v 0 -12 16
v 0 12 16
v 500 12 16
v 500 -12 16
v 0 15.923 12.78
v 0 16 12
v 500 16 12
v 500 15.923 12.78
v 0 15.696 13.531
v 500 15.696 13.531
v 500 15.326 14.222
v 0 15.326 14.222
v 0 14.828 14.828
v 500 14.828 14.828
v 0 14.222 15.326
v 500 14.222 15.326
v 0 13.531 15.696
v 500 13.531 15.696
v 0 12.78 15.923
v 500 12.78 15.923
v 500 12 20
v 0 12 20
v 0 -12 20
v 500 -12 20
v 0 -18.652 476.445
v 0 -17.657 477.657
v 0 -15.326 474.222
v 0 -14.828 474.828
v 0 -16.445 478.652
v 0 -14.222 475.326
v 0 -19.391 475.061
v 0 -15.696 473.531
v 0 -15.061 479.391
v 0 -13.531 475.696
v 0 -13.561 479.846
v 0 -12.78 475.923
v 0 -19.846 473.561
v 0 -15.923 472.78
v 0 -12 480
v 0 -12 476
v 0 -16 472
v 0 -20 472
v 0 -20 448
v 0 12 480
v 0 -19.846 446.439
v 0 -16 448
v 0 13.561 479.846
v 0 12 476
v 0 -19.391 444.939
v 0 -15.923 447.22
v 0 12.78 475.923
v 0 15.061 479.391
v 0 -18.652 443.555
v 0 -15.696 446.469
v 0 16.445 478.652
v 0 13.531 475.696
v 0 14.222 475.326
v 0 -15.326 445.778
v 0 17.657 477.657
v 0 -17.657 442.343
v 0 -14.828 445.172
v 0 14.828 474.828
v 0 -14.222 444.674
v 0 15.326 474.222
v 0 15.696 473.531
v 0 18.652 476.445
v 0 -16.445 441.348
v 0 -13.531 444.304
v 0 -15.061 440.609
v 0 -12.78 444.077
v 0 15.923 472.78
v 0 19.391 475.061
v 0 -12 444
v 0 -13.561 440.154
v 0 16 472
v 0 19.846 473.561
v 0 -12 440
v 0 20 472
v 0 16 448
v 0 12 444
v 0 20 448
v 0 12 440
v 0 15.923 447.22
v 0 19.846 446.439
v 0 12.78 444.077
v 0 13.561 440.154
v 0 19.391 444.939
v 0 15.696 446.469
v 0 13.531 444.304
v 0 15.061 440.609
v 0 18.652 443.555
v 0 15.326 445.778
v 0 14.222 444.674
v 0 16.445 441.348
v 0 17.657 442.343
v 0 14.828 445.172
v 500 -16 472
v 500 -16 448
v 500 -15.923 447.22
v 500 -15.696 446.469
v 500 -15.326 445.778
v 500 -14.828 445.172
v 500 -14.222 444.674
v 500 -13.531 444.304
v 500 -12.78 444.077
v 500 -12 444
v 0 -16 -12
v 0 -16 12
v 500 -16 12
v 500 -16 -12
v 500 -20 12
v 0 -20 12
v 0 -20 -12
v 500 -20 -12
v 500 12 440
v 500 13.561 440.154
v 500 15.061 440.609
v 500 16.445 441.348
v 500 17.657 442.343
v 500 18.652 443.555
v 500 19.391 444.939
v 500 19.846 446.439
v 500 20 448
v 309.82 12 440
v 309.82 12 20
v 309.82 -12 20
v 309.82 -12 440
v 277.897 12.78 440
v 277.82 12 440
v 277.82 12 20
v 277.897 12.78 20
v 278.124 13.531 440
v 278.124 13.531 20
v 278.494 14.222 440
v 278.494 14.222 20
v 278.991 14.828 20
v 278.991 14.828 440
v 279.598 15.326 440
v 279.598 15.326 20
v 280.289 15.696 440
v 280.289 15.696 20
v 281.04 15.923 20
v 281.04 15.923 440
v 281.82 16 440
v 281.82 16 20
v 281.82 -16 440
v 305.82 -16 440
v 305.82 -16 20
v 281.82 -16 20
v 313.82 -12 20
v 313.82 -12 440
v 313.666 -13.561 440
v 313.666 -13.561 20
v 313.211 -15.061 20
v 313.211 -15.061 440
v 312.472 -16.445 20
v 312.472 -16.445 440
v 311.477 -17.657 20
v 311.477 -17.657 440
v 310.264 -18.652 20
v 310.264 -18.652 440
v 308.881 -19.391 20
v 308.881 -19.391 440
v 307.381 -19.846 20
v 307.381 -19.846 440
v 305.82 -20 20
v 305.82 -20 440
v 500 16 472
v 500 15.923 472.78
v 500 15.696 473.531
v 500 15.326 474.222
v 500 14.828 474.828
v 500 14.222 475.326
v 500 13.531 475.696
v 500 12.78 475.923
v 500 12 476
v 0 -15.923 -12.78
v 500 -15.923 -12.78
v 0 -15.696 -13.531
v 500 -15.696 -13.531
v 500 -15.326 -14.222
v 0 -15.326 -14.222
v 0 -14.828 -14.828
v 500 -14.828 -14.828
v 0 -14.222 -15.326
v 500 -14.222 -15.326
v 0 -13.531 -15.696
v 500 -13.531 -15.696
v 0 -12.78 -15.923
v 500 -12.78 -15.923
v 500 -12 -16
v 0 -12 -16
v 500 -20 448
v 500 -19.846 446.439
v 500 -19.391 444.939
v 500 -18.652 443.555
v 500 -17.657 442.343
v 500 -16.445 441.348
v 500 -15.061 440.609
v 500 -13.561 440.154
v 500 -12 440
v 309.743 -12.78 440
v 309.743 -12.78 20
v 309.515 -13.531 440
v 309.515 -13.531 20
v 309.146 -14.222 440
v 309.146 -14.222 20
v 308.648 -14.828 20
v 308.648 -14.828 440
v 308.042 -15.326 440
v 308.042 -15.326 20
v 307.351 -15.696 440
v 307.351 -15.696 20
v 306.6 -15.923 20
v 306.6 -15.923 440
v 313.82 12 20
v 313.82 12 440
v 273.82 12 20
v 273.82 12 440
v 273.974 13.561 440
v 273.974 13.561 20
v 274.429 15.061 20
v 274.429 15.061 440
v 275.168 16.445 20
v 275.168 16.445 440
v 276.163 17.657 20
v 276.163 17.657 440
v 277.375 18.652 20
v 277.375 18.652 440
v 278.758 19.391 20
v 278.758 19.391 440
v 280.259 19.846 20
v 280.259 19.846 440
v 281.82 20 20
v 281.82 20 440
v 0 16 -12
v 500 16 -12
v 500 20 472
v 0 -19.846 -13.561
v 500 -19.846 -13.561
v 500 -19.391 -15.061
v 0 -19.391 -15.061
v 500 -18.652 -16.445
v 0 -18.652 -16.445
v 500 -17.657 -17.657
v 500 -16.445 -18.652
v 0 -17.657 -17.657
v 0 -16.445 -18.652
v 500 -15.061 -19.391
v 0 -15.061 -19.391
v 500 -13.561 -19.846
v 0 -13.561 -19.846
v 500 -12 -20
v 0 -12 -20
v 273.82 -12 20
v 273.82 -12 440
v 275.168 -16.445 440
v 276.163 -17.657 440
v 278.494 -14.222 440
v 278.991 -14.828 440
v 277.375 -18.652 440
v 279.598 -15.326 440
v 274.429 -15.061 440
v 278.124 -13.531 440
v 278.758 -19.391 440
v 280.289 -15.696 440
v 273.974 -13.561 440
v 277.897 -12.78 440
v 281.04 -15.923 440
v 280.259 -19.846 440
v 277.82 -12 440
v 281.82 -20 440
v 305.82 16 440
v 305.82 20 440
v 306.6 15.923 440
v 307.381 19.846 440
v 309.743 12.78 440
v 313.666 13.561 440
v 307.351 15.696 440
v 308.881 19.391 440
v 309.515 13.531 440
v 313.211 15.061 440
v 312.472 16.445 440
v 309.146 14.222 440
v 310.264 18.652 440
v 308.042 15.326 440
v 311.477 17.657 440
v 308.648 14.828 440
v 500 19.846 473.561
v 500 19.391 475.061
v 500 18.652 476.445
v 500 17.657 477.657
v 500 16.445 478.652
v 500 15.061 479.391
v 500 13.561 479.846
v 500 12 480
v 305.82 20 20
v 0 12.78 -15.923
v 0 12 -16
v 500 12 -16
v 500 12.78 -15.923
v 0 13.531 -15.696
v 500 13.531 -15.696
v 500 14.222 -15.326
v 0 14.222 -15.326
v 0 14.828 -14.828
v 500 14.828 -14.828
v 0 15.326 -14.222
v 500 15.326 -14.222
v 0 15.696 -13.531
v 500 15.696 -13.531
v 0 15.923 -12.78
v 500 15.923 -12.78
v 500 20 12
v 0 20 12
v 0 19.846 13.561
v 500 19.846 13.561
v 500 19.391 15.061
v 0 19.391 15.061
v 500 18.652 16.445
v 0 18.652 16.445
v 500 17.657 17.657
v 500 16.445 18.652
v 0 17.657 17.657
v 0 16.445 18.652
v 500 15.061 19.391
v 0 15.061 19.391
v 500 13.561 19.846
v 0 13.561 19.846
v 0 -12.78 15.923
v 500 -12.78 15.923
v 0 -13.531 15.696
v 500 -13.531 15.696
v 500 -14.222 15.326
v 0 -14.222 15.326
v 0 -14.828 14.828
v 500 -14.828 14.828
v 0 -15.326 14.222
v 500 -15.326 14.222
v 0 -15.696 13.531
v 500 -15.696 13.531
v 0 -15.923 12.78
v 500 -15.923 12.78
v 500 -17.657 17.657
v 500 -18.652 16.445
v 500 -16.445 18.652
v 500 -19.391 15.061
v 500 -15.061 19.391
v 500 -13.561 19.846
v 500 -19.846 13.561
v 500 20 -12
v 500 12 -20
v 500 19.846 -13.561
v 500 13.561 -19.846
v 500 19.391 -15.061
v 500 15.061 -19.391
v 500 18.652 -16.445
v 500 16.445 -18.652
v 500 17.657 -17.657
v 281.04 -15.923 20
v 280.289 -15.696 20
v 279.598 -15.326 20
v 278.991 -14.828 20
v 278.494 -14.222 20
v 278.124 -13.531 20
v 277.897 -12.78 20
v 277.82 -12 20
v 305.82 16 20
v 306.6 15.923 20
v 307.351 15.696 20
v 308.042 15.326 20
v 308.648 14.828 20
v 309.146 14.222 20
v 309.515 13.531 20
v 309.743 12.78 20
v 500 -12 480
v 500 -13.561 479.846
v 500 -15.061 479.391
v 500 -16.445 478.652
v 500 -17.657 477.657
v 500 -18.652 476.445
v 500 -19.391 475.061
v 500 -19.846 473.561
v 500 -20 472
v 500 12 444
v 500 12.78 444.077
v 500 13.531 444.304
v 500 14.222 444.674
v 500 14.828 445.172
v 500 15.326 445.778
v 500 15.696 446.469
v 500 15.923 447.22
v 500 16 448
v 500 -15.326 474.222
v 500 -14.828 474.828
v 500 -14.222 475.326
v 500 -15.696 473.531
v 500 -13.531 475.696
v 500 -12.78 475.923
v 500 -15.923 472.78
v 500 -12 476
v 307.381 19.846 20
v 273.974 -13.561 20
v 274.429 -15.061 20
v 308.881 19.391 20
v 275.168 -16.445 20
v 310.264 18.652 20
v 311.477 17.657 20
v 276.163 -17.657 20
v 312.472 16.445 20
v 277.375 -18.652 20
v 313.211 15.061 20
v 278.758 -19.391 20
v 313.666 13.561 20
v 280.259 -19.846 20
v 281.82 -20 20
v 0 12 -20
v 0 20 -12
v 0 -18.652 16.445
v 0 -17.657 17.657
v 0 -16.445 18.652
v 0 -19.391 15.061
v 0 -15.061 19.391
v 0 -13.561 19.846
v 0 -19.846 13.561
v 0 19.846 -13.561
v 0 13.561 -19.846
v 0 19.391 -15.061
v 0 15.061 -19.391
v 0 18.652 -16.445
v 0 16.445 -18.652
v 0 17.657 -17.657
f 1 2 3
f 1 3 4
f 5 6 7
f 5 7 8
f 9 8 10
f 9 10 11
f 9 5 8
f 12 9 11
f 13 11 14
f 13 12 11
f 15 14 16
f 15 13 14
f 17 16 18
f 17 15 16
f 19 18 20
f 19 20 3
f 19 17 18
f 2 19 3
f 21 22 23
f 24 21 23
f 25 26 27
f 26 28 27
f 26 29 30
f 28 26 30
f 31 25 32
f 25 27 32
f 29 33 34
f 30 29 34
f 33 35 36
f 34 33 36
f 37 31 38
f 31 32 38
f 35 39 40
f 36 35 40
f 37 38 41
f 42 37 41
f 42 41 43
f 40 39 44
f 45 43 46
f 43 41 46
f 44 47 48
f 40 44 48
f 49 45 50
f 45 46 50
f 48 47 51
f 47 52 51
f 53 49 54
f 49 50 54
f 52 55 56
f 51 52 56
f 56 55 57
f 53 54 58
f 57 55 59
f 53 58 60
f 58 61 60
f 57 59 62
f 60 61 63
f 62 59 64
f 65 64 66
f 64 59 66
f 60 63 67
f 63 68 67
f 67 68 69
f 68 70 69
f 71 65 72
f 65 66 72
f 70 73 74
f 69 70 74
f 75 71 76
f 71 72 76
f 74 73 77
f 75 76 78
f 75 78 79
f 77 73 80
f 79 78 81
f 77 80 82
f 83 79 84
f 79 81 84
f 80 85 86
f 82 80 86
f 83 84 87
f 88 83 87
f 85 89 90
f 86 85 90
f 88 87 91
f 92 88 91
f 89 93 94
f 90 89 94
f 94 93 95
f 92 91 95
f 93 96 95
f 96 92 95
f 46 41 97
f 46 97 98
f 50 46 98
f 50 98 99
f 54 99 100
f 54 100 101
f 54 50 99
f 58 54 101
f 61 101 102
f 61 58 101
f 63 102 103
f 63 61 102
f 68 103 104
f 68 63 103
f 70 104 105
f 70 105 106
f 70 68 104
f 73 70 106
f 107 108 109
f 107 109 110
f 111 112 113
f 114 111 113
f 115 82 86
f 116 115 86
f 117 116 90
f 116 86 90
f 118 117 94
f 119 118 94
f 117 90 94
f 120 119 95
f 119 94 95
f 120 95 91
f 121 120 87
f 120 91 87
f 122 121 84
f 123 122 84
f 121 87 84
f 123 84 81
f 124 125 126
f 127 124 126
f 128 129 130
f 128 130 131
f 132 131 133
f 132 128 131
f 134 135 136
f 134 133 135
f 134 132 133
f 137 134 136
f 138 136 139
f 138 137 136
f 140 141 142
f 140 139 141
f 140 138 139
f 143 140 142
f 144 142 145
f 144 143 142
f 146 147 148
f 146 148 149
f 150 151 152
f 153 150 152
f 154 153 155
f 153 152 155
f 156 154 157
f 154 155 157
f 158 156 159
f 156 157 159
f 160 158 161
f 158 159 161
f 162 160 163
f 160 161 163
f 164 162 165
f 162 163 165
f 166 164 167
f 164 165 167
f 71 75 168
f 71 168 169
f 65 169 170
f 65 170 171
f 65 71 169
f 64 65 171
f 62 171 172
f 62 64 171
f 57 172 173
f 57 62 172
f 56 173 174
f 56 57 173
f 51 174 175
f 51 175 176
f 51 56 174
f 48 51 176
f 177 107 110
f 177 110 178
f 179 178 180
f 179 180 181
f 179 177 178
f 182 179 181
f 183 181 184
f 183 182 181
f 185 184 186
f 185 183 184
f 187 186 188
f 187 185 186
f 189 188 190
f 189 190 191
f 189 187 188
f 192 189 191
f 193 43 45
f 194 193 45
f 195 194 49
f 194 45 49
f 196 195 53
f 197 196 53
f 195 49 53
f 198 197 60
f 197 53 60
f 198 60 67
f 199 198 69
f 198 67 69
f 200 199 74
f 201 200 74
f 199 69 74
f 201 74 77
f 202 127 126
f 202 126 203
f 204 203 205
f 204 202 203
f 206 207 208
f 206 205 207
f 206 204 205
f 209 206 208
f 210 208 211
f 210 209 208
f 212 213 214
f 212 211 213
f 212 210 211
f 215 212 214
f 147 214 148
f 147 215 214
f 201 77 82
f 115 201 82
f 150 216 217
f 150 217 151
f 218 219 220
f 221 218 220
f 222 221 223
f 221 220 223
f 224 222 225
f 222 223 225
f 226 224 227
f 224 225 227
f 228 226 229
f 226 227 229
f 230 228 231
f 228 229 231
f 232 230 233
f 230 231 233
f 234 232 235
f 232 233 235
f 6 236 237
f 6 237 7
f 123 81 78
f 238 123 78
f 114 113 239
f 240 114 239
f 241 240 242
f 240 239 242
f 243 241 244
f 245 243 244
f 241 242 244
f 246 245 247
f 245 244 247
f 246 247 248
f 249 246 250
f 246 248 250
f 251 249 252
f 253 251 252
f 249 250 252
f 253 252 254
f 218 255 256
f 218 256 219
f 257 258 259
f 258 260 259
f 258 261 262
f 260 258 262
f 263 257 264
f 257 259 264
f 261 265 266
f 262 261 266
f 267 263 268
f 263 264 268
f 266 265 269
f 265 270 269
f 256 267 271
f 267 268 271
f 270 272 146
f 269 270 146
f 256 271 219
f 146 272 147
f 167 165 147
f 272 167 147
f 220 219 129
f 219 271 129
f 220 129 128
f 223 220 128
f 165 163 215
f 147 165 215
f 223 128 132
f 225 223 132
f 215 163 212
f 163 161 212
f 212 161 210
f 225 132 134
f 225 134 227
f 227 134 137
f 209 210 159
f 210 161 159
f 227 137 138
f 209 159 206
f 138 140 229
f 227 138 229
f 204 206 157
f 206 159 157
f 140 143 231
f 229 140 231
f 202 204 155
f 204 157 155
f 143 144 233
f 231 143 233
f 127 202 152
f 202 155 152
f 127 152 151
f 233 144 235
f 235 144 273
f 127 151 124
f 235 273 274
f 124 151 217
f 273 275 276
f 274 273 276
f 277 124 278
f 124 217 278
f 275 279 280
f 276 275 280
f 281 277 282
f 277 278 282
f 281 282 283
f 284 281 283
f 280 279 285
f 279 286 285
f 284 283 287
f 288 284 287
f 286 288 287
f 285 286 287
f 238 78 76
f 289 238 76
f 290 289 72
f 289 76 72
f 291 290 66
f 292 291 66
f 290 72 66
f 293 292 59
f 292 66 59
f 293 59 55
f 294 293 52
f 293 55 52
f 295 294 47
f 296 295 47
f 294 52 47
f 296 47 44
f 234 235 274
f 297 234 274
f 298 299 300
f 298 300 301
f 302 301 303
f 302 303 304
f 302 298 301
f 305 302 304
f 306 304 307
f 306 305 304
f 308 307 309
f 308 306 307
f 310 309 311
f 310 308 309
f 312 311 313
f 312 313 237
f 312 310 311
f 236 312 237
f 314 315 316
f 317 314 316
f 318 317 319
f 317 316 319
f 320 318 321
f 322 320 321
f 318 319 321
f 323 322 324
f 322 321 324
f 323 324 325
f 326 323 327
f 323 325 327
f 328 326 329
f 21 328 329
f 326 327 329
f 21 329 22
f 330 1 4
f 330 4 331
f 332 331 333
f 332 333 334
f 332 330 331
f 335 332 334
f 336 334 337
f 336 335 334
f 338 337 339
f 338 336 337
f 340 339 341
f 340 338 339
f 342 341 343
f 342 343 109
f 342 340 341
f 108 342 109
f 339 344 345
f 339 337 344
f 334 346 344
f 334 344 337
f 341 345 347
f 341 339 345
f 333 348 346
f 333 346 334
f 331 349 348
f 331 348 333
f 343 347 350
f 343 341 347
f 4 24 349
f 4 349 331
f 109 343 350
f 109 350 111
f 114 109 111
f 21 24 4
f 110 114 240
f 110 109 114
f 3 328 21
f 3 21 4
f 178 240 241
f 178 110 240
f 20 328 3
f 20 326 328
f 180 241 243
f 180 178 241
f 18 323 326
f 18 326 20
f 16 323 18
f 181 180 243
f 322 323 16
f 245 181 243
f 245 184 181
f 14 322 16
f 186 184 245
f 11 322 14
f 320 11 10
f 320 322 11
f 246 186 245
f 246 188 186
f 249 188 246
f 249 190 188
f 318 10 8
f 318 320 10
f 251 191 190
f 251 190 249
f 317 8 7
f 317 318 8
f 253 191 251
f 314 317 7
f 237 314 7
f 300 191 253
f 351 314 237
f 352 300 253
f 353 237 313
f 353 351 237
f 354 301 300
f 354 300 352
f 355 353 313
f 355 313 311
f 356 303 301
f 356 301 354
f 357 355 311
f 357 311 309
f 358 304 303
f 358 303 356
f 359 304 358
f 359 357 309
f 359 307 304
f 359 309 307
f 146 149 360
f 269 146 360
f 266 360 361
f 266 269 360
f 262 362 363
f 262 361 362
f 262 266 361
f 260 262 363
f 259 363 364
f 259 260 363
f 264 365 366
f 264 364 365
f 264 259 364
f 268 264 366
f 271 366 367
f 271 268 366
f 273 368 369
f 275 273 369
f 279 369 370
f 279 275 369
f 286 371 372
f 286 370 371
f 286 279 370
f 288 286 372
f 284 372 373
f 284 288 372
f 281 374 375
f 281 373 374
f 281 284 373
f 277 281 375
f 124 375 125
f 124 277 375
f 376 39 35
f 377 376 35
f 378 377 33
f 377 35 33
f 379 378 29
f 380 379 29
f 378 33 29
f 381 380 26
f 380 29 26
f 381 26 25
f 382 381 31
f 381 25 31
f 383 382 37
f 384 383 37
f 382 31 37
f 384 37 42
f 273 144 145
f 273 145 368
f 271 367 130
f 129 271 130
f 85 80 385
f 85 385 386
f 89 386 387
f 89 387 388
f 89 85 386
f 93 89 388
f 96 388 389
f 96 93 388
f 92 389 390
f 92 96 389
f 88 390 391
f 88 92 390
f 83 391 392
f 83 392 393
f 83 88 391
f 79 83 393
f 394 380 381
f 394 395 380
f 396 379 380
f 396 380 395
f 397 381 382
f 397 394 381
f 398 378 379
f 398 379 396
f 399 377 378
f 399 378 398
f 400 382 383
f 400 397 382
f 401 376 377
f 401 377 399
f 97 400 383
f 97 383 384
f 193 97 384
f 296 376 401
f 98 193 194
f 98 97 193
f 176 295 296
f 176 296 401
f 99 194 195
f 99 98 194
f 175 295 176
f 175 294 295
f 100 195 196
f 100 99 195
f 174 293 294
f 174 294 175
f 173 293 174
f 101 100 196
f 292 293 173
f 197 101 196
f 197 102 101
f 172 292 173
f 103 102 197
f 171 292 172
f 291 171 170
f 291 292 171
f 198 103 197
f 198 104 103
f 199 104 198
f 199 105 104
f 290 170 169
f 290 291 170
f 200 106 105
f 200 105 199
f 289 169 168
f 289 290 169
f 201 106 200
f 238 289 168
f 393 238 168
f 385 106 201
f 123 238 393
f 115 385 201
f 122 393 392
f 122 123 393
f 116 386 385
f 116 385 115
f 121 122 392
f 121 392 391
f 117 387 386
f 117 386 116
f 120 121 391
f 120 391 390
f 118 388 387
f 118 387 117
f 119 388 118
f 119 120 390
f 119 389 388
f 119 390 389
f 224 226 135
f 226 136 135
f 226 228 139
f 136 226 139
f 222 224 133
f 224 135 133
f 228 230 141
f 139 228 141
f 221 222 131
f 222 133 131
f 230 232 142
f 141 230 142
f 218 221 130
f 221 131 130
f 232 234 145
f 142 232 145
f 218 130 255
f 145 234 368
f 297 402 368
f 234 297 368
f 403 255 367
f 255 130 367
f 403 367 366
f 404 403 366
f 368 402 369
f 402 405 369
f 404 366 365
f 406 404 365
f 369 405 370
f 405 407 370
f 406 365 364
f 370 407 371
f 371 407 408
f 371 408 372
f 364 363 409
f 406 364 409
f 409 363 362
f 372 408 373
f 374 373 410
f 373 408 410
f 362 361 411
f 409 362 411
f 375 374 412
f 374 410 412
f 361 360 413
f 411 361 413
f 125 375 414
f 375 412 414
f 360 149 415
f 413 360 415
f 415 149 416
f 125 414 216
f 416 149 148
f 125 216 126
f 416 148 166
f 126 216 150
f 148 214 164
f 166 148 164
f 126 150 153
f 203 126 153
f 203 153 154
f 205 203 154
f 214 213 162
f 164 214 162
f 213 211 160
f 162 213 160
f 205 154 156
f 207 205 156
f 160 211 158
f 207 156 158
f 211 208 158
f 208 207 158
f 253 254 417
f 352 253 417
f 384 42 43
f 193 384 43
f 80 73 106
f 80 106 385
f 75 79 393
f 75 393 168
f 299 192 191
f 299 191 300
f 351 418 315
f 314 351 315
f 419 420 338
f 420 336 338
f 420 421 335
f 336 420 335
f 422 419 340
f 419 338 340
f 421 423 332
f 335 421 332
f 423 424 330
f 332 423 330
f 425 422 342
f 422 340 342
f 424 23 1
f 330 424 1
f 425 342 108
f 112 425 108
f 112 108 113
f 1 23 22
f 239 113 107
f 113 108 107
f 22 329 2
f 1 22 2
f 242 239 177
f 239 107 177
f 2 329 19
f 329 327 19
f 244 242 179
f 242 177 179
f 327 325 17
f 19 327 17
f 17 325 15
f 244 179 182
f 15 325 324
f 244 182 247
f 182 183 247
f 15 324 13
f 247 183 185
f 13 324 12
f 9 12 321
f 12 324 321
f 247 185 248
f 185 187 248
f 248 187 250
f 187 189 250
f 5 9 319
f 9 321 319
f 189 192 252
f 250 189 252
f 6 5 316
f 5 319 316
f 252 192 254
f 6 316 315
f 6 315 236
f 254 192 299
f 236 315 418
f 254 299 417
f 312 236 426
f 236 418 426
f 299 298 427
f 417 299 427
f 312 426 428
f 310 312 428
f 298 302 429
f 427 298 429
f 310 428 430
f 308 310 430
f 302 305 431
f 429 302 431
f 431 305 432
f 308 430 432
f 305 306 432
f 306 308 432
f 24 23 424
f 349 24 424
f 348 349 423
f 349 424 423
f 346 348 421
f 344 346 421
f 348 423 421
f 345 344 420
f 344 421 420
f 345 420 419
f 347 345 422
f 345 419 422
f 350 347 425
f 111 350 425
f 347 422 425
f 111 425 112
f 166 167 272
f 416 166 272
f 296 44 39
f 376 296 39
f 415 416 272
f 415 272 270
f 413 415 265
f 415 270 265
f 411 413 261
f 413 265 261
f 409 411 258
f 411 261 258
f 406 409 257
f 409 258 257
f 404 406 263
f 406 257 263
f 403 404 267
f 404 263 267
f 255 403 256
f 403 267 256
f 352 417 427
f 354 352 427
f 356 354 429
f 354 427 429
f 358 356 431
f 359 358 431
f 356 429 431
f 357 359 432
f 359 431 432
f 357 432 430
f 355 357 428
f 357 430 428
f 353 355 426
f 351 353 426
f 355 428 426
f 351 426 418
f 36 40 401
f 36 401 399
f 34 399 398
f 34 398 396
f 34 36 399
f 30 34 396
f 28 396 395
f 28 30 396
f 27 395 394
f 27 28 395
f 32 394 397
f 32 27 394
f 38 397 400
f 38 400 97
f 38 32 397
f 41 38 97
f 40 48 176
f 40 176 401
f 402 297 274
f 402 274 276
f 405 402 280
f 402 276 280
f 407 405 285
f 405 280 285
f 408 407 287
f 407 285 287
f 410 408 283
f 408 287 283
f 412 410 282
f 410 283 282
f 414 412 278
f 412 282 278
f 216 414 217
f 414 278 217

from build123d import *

# Parameters (mm, degrees)
SQUARE_TUBE_40_X_40_X_4_1_DEPTH   = 500
SQUARE_TUBE_40_X_40_X_4_1_2_DEPTH = 500
SQUARE_TUBE_40_X_40_X_4_1_3_DEPTH = 462


with BuildPart() as part:
    # Sketch1 → Square tube 40 X 40 X 4(1) (new body)
    with BuildSketch(Plane(origin=(0, 0, 0), x_dir=(0, 0, -1), z_dir=(1, 0, 0))):
        with BuildLine():
            Line((-12, -20), (12, -20))
            ThreePointArc((12, -20), (17.656854249, -17.656854249), (20, -12))
            Line((20, -12), (20, 12))
            ThreePointArc((20, 12), (17.656854249, 17.656854249), (12, 20))
            Line((12, 20), (-12, 20))
            ThreePointArc((-12, 20), (-17.656854249, 17.656854249), (-20, 12))
            Line((-20, 12), (-20, -12))
            ThreePointArc((-20, -12), (-17.656854249, -17.656854249), (-12, -20))
        make_face()
        with BuildLine():
            Line((-12, -16), (12, -16))
            ThreePointArc((12, -16), (14.828427125, -14.828427125), (16, -12))
            Line((16, -12), (16, 12))
            ThreePointArc((16, 12), (14.828427125, 14.828427125), (12, 16))
            Line((12, 16), (-12, 16))
            ThreePointArc((-12, 16), (-14.828427125, 14.828427125), (-16, 12))
            Line((-16, 12), (-16, -12))
            ThreePointArc((-16, -12), (-14.828427125, -14.828427125), (-12, -16))
        make_face(mode=Mode.SUBTRACT)
    extrude(amount=SQUARE_TUBE_40_X_40_X_4_1_DEPTH)


with BuildPart() as body_2:
    # Sketch1 on segment 2 (carried to segment 2) → Square tube 40 X 40 X 4_1 2 (new body)
    with BuildSketch(Plane(origin=(0, 0, 460), x_dir=(0, 0, -1), z_dir=(1, 0, 0))):
        with BuildLine():
            Line((-12, -20), (12, -20))
            ThreePointArc((12, -20), (17.656854249, -17.656854249), (20, -12))
            Line((20, -12), (20, 12))
            ThreePointArc((20, 12), (17.656854249, 17.656854249), (12, 20))
            Line((12, 20), (-12, 20))
            ThreePointArc((-12, 20), (-17.656854249, 17.656854249), (-20, 12))
            Line((-20, 12), (-20, -12))
            ThreePointArc((-20, -12), (-17.656854249, -17.656854249), (-12, -20))
        make_face()
        with BuildLine():
            Line((-12, -16), (12, -16))
            ThreePointArc((12, -16), (14.828427125, -14.828427125), (16, -12))
            Line((16, -12), (16, 12))
            ThreePointArc((16, 12), (14.828427125, 14.828427125), (12, 16))
            Line((12, 16), (-12, 16))
            ThreePointArc((-12, 16), (-14.828427125, 14.828427125), (-16, 12))
            Line((-16, 12), (-16, -12))
            ThreePointArc((-16, -12), (-14.828427125, -14.828427125), (-12, -16))
        make_face(mode=Mode.SUBTRACT)
    extrude(amount=SQUARE_TUBE_40_X_40_X_4_1_2_DEPTH)


with BuildPart() as body_3:
    # Sketch1 on segment 3 (carried to segment 3) → Square tube 40 X 40 X 4_1 3 (new body)
    with BuildSketch(Plane(origin=(293.819864636, 0, 461), x_dir=(-1, 0, 0), z_dir=(0, 0, -1))):
        with BuildLine():
            Line((-12, -20), (12, -20))
            ThreePointArc((12, -20), (17.656854249, -17.656854249), (20, -12))
            Line((20, -12), (20, 12))
            ThreePointArc((20, 12), (17.656854249, 17.656854249), (12, 20))
            Line((12, 20), (-12, 20))
            ThreePointArc((-12, 20), (-17.656854249, 17.656854249), (-20, 12))
            Line((-20, 12), (-20, -12))
            ThreePointArc((-20, -12), (-17.656854249, -17.656854249), (-12, -20))
        make_face()
        with BuildLine():
            Line((-12, -16), (12, -16))
            ThreePointArc((12, -16), (14.828427125, -14.828427125), (16, -12))
            Line((16, -12), (16, 12))
            ThreePointArc((16, 12), (14.828427125, 14.828427125), (12, 16))
            Line((12, 16), (-12, 16))
            ThreePointArc((-12, 16), (-14.828427125, 14.828427125), (-16, 12))
            Line((-16, 12), (-16, -12))
            ThreePointArc((-16, -12), (-14.828427125, -14.828427125), (-12, -16))
        make_face(mode=Mode.SUBTRACT)
    extrude(amount=SQUARE_TUBE_40_X_40_X_4_1_3_DEPTH)

    # Square tube 40 X 40 X 4_1 3 end butt 1
    split(bisect_by=Plane(origin=(293.819864636, 0, 440), x_dir=(0, 1, 0), z_dir=(0, 0, -1)), keep=Keep.TOP)

    # Square tube 40 X 40 X 4_1 3 end butt 2
    split(bisect_by=Plane(origin=(293.819864636, 0, 20), x_dir=(0, -1, 0), z_dir=(0, 0, 1)), keep=Keep.TOP)


solid = Compound([part.part, body_2.part, body_3.part])
